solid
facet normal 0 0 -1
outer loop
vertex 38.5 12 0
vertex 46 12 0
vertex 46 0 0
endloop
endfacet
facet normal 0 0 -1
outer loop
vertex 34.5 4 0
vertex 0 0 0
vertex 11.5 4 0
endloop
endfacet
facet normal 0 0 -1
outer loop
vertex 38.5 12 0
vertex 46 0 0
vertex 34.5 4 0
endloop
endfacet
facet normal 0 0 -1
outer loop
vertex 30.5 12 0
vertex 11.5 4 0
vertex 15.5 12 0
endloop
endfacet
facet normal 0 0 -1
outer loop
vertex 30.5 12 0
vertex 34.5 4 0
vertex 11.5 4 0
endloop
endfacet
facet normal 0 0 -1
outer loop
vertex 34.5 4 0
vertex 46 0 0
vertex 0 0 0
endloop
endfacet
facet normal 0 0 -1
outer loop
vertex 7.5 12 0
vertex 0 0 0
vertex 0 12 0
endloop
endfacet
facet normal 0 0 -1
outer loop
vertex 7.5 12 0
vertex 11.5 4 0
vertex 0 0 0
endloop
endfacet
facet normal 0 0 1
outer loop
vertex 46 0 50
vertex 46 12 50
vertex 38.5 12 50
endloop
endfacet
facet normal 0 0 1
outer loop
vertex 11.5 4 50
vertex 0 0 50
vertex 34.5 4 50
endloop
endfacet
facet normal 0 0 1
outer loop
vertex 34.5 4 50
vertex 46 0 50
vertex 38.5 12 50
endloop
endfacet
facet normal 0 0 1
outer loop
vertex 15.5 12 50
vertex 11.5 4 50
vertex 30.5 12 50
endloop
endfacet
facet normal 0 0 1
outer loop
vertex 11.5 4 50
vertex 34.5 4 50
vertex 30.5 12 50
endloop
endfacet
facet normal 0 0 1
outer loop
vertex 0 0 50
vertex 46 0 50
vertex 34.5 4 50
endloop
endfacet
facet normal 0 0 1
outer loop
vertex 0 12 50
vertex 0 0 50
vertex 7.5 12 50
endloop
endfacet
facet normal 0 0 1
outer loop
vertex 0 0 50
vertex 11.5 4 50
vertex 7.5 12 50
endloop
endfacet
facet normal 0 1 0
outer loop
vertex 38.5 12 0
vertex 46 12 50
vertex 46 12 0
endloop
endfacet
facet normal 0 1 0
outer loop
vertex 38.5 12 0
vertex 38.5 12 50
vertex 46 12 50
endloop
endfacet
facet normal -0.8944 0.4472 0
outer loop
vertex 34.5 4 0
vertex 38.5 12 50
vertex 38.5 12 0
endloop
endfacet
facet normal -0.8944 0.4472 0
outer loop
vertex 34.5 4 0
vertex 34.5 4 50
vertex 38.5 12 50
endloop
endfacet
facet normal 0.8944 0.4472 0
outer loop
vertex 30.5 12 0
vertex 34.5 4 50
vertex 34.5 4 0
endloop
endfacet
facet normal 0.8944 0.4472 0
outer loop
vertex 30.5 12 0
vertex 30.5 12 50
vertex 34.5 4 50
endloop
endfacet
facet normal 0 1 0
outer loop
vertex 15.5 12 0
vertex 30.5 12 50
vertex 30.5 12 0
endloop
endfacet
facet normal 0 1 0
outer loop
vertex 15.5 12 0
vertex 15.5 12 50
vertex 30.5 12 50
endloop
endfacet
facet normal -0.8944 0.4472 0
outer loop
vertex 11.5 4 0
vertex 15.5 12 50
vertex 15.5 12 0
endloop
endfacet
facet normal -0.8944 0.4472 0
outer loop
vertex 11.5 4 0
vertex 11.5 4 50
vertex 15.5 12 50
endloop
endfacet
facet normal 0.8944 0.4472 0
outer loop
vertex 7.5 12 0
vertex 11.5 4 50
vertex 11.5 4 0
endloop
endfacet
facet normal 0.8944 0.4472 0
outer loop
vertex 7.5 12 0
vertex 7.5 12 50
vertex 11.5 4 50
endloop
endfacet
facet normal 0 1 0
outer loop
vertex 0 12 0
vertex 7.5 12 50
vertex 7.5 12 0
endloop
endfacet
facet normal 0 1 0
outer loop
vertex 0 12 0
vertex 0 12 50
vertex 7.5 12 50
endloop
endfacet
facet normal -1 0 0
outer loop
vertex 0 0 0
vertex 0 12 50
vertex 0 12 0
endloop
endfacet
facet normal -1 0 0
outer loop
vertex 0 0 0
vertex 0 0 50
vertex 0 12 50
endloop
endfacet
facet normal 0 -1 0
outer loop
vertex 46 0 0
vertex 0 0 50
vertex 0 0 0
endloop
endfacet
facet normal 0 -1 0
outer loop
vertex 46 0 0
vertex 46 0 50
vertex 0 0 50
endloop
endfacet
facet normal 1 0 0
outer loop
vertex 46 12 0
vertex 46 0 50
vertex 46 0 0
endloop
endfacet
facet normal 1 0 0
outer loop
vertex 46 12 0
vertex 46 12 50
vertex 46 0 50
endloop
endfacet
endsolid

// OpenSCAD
$fn = 32;

// ----------------------------------------------------------------------
// V guide rail: doublev, 46 mm wide
// ----------------------------------------------------------------------

// --- parameters (mm) ---
rail_w = 46;              // rail width, X
base_t = 12;              // base plate thickness
v_depth = 8;              // V feature depth / height
v_half_w = 8;             // half width of the V at the base face
plate_t = 50;             // rail length, Z (the extrusion height)
groove_off = 11.5;        // offset of each groove from the centreline

centre_x = rail_w / 2;  // rail centreline
groove_a = centre_x - groove_off;  // axis of the first groove
groove_b = centre_x + groove_off;  // axis of the second groove

profile = [[0, 0], [46, 0], [46, 12], [38.5, 12], [34.5, 4], [30.5, 12], [15.5, 12], [11.5, 4], [7.5, 12], [0, 12]];  // primary outline, 10 points, counter clockwise

// --- the one profile operation ---
linear_extrude(height = plate_t) polygon(points = profile);
